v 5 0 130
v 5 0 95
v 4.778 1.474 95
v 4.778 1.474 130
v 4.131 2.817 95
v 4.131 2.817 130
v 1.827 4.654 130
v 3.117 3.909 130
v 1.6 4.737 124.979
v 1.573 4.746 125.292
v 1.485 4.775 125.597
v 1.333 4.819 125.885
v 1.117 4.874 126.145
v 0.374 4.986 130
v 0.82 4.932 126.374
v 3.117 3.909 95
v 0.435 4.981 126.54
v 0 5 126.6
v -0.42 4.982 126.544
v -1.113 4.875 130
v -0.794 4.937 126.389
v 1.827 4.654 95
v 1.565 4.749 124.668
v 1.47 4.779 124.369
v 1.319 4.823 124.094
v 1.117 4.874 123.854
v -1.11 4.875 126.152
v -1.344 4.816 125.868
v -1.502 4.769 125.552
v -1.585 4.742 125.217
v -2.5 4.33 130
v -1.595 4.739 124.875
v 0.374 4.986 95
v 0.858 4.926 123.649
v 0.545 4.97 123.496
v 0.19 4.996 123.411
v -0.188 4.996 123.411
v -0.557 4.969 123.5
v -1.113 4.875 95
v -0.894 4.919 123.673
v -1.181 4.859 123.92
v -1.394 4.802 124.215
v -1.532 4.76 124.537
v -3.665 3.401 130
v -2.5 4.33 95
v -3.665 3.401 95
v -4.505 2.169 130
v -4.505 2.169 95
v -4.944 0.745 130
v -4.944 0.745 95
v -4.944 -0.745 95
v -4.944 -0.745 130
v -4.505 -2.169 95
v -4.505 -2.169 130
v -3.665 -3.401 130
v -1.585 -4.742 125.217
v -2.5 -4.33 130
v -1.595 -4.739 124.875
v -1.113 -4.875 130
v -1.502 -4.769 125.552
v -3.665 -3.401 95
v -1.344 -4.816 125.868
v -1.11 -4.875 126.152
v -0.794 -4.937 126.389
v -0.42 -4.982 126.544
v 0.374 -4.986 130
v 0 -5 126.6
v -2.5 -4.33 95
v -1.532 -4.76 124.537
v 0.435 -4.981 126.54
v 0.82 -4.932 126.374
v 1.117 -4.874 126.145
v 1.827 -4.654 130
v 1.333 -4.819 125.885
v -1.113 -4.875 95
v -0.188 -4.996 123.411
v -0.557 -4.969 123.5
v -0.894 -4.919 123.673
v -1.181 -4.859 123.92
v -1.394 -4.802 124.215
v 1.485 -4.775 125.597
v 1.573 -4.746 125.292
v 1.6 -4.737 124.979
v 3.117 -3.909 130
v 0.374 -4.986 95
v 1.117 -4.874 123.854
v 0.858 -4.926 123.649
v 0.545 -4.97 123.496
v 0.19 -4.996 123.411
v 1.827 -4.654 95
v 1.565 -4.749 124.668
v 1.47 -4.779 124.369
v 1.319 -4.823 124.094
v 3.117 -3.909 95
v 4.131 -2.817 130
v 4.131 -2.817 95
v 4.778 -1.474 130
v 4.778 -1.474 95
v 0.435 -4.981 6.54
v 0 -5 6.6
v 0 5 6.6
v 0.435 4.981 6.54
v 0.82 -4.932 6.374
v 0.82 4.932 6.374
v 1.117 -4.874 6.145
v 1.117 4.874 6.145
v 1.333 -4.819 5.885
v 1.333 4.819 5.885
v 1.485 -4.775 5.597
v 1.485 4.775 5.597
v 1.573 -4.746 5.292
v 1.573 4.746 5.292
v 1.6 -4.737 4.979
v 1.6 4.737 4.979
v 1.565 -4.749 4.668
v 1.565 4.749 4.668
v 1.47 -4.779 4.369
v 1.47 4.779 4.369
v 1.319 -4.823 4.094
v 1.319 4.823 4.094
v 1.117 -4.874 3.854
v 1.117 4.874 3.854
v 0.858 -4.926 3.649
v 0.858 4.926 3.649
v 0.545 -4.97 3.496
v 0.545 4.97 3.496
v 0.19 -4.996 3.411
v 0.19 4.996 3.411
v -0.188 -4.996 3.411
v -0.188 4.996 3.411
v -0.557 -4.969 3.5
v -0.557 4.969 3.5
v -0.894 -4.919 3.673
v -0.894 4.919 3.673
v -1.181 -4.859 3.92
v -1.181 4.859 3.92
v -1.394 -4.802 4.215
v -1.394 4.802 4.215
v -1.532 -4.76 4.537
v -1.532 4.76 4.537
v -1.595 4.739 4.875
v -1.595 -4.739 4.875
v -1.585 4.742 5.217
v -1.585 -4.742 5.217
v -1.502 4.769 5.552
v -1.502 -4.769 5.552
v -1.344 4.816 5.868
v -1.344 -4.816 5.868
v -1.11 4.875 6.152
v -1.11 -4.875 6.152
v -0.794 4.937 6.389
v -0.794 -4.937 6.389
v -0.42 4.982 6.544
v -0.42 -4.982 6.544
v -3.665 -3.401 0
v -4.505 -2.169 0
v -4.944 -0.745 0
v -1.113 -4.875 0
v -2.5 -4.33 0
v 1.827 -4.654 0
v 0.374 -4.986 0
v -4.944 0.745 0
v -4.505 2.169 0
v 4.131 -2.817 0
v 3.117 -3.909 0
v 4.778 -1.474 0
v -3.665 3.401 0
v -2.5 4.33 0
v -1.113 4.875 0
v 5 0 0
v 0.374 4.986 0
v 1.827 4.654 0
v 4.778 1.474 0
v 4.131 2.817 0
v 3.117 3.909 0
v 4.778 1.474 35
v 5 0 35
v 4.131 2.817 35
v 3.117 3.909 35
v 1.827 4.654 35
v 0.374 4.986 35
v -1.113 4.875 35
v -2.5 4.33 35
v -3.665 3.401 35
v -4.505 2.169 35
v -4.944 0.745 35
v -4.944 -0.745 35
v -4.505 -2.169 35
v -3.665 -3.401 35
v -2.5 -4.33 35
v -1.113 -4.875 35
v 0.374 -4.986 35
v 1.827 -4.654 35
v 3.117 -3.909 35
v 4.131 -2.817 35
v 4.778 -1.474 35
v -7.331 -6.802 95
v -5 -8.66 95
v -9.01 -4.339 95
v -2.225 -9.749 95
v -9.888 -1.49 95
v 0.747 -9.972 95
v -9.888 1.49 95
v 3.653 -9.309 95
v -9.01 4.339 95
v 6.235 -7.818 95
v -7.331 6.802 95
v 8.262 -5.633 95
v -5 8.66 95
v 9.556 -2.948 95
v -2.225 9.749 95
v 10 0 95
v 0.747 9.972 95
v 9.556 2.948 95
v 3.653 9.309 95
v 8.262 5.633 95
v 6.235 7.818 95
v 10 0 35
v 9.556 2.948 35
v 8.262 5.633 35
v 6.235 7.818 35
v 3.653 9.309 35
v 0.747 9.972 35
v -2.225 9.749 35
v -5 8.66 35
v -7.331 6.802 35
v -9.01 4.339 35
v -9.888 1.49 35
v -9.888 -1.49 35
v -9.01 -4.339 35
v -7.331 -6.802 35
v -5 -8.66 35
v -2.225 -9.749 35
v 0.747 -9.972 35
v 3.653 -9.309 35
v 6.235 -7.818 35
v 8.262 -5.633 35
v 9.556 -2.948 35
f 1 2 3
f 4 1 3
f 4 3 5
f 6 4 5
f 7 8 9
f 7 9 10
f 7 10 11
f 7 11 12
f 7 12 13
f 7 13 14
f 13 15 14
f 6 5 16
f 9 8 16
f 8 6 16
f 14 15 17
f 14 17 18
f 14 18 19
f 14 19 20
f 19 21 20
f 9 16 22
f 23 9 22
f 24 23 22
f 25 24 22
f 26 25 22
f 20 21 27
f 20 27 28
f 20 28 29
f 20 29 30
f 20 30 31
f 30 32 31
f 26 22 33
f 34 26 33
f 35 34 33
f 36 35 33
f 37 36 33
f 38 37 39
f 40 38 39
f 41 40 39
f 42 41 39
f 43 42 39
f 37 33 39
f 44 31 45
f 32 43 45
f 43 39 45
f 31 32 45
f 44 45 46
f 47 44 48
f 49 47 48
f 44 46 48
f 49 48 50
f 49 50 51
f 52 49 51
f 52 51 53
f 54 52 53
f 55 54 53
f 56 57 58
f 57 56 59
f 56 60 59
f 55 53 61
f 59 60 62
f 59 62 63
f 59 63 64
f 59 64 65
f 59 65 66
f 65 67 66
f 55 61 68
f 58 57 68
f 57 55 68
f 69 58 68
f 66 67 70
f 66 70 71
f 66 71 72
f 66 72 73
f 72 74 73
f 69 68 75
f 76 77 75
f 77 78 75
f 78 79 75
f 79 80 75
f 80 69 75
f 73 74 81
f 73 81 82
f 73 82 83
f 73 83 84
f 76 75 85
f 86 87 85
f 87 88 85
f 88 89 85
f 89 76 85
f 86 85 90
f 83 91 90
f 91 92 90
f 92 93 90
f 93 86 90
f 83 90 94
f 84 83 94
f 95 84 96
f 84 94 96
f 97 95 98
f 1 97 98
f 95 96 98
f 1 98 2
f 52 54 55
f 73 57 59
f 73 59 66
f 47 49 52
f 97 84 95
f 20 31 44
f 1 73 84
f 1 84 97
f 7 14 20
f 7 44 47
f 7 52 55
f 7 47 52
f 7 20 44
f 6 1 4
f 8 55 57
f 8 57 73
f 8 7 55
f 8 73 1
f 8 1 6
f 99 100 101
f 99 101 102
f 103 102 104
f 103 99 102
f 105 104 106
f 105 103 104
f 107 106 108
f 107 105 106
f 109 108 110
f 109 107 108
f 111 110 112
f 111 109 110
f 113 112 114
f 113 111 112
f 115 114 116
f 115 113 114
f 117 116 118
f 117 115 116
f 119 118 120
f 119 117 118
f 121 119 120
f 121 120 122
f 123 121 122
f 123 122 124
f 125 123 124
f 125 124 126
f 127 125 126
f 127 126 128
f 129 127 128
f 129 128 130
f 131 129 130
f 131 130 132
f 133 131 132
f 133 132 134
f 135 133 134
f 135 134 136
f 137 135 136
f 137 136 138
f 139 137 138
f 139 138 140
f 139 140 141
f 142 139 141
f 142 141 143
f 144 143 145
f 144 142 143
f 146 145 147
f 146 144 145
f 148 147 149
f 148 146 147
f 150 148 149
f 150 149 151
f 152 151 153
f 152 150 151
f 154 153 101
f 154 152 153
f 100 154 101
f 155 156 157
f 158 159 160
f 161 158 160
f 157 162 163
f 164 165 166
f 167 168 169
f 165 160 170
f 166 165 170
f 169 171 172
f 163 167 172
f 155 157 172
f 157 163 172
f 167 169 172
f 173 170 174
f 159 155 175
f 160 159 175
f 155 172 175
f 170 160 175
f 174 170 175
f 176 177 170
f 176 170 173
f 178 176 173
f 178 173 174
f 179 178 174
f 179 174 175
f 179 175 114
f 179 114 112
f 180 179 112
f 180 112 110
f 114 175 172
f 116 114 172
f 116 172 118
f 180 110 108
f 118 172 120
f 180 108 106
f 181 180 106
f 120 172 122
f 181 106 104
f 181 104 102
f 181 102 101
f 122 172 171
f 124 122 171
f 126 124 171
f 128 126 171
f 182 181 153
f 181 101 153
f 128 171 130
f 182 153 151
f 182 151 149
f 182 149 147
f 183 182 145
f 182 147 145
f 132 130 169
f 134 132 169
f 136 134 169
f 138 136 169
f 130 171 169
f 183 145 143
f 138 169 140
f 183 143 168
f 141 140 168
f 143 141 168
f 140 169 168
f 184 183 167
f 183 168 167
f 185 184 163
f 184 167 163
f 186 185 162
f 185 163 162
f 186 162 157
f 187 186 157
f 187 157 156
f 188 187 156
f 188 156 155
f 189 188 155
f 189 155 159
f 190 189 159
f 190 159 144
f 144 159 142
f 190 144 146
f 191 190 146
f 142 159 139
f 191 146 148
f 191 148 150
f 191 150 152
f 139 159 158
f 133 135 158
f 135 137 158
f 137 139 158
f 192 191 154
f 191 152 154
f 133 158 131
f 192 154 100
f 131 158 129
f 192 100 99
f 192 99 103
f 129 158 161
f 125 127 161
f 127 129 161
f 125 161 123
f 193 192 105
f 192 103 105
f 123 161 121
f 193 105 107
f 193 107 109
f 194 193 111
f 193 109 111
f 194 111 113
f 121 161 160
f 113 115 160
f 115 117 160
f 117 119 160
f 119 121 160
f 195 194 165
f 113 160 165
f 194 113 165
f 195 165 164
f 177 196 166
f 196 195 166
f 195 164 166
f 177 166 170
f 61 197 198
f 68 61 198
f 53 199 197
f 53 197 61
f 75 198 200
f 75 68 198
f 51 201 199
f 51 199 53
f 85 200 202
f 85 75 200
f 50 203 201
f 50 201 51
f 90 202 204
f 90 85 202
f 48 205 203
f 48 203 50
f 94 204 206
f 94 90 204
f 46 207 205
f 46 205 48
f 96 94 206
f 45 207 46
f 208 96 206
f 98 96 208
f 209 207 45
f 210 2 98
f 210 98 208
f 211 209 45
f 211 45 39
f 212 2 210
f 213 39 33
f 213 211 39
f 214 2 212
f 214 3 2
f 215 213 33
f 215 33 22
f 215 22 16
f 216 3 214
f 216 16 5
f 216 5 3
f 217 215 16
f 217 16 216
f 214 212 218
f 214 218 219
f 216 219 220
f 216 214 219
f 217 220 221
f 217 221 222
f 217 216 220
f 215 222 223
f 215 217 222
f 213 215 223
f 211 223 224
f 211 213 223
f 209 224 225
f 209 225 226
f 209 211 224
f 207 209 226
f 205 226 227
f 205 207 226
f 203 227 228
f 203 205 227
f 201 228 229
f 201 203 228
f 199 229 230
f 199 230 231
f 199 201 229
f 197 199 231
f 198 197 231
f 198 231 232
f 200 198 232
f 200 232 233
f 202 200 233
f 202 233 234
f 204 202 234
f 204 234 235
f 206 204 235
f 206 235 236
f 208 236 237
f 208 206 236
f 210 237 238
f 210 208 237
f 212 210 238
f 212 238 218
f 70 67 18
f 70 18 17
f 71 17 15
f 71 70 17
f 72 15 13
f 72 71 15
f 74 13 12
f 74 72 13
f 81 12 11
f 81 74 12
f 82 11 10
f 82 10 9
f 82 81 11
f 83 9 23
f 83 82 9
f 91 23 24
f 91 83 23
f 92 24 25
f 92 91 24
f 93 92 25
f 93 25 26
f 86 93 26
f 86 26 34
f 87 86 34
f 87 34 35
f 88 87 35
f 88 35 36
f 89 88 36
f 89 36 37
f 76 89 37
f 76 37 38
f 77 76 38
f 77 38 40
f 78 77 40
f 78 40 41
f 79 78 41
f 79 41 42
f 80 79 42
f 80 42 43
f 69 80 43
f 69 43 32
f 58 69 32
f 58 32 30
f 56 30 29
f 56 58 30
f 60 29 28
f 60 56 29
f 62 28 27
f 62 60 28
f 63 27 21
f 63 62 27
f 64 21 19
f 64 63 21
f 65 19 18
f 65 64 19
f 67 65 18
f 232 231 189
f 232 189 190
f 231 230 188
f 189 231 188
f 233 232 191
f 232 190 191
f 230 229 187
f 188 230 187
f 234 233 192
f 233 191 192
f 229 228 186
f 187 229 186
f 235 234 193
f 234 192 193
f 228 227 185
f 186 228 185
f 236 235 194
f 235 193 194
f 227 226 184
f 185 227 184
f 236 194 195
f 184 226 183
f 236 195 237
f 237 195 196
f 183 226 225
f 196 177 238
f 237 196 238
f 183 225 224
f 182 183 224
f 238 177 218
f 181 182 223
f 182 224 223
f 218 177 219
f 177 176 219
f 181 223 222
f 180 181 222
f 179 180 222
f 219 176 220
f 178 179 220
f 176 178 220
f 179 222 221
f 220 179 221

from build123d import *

# Parameters (mm, degrees)
SKETCH_1_R               = 5
EXTRUDE_1_DEPTH          = 130
EXTRUDE_START            = -35
SKETCH_2_R               = 10
EXTRUDE_2_DEPTH          = 60
CUT_EXTRUDE_1_DEPTH      = 131.766968306
CUT_EXTRUDE_1_DEPTH_BACK = 131.766968306
SKETCH_3_R               = 1.6


with BuildPart() as part:
    # 草图1 → 凸台-拉伸1 (new body)
    with BuildSketch(Plane.XY):
        Circle(SKETCH_1_R)
    extrude(amount=EXTRUDE_1_DEPTH)

    # 草图2 → 凸台-拉伸2 (add)
    with BuildSketch(Plane.XY.offset(130).offset(EXTRUDE_START)):
        Circle(SKETCH_2_R)
    extrude(amount=-EXTRUDE_2_DEPTH)

    # 草图3 → 切除-拉伸1 (cut, two sides: drawn at the far end of the back side and taken through both)
    with BuildSketch(Plane(origin=(0, 0, 0), x_dir=(1, 0, 0), z_dir=(0, 1, 0)).offset(-CUT_EXTRUDE_1_DEPTH_BACK)):
        with Locations(Location((0, -125, 0), (0, 0, 270))):
            Circle(SKETCH_3_R)
        with Locations(Location((0, -5, 0), (0, 0, 270))):
            Circle(SKETCH_3_R)
    extrude(amount=CUT_EXTRUDE_1_DEPTH + CUT_EXTRUDE_1_DEPTH_BACK, mode=Mode.SUBTRACT)


solid = part.part
